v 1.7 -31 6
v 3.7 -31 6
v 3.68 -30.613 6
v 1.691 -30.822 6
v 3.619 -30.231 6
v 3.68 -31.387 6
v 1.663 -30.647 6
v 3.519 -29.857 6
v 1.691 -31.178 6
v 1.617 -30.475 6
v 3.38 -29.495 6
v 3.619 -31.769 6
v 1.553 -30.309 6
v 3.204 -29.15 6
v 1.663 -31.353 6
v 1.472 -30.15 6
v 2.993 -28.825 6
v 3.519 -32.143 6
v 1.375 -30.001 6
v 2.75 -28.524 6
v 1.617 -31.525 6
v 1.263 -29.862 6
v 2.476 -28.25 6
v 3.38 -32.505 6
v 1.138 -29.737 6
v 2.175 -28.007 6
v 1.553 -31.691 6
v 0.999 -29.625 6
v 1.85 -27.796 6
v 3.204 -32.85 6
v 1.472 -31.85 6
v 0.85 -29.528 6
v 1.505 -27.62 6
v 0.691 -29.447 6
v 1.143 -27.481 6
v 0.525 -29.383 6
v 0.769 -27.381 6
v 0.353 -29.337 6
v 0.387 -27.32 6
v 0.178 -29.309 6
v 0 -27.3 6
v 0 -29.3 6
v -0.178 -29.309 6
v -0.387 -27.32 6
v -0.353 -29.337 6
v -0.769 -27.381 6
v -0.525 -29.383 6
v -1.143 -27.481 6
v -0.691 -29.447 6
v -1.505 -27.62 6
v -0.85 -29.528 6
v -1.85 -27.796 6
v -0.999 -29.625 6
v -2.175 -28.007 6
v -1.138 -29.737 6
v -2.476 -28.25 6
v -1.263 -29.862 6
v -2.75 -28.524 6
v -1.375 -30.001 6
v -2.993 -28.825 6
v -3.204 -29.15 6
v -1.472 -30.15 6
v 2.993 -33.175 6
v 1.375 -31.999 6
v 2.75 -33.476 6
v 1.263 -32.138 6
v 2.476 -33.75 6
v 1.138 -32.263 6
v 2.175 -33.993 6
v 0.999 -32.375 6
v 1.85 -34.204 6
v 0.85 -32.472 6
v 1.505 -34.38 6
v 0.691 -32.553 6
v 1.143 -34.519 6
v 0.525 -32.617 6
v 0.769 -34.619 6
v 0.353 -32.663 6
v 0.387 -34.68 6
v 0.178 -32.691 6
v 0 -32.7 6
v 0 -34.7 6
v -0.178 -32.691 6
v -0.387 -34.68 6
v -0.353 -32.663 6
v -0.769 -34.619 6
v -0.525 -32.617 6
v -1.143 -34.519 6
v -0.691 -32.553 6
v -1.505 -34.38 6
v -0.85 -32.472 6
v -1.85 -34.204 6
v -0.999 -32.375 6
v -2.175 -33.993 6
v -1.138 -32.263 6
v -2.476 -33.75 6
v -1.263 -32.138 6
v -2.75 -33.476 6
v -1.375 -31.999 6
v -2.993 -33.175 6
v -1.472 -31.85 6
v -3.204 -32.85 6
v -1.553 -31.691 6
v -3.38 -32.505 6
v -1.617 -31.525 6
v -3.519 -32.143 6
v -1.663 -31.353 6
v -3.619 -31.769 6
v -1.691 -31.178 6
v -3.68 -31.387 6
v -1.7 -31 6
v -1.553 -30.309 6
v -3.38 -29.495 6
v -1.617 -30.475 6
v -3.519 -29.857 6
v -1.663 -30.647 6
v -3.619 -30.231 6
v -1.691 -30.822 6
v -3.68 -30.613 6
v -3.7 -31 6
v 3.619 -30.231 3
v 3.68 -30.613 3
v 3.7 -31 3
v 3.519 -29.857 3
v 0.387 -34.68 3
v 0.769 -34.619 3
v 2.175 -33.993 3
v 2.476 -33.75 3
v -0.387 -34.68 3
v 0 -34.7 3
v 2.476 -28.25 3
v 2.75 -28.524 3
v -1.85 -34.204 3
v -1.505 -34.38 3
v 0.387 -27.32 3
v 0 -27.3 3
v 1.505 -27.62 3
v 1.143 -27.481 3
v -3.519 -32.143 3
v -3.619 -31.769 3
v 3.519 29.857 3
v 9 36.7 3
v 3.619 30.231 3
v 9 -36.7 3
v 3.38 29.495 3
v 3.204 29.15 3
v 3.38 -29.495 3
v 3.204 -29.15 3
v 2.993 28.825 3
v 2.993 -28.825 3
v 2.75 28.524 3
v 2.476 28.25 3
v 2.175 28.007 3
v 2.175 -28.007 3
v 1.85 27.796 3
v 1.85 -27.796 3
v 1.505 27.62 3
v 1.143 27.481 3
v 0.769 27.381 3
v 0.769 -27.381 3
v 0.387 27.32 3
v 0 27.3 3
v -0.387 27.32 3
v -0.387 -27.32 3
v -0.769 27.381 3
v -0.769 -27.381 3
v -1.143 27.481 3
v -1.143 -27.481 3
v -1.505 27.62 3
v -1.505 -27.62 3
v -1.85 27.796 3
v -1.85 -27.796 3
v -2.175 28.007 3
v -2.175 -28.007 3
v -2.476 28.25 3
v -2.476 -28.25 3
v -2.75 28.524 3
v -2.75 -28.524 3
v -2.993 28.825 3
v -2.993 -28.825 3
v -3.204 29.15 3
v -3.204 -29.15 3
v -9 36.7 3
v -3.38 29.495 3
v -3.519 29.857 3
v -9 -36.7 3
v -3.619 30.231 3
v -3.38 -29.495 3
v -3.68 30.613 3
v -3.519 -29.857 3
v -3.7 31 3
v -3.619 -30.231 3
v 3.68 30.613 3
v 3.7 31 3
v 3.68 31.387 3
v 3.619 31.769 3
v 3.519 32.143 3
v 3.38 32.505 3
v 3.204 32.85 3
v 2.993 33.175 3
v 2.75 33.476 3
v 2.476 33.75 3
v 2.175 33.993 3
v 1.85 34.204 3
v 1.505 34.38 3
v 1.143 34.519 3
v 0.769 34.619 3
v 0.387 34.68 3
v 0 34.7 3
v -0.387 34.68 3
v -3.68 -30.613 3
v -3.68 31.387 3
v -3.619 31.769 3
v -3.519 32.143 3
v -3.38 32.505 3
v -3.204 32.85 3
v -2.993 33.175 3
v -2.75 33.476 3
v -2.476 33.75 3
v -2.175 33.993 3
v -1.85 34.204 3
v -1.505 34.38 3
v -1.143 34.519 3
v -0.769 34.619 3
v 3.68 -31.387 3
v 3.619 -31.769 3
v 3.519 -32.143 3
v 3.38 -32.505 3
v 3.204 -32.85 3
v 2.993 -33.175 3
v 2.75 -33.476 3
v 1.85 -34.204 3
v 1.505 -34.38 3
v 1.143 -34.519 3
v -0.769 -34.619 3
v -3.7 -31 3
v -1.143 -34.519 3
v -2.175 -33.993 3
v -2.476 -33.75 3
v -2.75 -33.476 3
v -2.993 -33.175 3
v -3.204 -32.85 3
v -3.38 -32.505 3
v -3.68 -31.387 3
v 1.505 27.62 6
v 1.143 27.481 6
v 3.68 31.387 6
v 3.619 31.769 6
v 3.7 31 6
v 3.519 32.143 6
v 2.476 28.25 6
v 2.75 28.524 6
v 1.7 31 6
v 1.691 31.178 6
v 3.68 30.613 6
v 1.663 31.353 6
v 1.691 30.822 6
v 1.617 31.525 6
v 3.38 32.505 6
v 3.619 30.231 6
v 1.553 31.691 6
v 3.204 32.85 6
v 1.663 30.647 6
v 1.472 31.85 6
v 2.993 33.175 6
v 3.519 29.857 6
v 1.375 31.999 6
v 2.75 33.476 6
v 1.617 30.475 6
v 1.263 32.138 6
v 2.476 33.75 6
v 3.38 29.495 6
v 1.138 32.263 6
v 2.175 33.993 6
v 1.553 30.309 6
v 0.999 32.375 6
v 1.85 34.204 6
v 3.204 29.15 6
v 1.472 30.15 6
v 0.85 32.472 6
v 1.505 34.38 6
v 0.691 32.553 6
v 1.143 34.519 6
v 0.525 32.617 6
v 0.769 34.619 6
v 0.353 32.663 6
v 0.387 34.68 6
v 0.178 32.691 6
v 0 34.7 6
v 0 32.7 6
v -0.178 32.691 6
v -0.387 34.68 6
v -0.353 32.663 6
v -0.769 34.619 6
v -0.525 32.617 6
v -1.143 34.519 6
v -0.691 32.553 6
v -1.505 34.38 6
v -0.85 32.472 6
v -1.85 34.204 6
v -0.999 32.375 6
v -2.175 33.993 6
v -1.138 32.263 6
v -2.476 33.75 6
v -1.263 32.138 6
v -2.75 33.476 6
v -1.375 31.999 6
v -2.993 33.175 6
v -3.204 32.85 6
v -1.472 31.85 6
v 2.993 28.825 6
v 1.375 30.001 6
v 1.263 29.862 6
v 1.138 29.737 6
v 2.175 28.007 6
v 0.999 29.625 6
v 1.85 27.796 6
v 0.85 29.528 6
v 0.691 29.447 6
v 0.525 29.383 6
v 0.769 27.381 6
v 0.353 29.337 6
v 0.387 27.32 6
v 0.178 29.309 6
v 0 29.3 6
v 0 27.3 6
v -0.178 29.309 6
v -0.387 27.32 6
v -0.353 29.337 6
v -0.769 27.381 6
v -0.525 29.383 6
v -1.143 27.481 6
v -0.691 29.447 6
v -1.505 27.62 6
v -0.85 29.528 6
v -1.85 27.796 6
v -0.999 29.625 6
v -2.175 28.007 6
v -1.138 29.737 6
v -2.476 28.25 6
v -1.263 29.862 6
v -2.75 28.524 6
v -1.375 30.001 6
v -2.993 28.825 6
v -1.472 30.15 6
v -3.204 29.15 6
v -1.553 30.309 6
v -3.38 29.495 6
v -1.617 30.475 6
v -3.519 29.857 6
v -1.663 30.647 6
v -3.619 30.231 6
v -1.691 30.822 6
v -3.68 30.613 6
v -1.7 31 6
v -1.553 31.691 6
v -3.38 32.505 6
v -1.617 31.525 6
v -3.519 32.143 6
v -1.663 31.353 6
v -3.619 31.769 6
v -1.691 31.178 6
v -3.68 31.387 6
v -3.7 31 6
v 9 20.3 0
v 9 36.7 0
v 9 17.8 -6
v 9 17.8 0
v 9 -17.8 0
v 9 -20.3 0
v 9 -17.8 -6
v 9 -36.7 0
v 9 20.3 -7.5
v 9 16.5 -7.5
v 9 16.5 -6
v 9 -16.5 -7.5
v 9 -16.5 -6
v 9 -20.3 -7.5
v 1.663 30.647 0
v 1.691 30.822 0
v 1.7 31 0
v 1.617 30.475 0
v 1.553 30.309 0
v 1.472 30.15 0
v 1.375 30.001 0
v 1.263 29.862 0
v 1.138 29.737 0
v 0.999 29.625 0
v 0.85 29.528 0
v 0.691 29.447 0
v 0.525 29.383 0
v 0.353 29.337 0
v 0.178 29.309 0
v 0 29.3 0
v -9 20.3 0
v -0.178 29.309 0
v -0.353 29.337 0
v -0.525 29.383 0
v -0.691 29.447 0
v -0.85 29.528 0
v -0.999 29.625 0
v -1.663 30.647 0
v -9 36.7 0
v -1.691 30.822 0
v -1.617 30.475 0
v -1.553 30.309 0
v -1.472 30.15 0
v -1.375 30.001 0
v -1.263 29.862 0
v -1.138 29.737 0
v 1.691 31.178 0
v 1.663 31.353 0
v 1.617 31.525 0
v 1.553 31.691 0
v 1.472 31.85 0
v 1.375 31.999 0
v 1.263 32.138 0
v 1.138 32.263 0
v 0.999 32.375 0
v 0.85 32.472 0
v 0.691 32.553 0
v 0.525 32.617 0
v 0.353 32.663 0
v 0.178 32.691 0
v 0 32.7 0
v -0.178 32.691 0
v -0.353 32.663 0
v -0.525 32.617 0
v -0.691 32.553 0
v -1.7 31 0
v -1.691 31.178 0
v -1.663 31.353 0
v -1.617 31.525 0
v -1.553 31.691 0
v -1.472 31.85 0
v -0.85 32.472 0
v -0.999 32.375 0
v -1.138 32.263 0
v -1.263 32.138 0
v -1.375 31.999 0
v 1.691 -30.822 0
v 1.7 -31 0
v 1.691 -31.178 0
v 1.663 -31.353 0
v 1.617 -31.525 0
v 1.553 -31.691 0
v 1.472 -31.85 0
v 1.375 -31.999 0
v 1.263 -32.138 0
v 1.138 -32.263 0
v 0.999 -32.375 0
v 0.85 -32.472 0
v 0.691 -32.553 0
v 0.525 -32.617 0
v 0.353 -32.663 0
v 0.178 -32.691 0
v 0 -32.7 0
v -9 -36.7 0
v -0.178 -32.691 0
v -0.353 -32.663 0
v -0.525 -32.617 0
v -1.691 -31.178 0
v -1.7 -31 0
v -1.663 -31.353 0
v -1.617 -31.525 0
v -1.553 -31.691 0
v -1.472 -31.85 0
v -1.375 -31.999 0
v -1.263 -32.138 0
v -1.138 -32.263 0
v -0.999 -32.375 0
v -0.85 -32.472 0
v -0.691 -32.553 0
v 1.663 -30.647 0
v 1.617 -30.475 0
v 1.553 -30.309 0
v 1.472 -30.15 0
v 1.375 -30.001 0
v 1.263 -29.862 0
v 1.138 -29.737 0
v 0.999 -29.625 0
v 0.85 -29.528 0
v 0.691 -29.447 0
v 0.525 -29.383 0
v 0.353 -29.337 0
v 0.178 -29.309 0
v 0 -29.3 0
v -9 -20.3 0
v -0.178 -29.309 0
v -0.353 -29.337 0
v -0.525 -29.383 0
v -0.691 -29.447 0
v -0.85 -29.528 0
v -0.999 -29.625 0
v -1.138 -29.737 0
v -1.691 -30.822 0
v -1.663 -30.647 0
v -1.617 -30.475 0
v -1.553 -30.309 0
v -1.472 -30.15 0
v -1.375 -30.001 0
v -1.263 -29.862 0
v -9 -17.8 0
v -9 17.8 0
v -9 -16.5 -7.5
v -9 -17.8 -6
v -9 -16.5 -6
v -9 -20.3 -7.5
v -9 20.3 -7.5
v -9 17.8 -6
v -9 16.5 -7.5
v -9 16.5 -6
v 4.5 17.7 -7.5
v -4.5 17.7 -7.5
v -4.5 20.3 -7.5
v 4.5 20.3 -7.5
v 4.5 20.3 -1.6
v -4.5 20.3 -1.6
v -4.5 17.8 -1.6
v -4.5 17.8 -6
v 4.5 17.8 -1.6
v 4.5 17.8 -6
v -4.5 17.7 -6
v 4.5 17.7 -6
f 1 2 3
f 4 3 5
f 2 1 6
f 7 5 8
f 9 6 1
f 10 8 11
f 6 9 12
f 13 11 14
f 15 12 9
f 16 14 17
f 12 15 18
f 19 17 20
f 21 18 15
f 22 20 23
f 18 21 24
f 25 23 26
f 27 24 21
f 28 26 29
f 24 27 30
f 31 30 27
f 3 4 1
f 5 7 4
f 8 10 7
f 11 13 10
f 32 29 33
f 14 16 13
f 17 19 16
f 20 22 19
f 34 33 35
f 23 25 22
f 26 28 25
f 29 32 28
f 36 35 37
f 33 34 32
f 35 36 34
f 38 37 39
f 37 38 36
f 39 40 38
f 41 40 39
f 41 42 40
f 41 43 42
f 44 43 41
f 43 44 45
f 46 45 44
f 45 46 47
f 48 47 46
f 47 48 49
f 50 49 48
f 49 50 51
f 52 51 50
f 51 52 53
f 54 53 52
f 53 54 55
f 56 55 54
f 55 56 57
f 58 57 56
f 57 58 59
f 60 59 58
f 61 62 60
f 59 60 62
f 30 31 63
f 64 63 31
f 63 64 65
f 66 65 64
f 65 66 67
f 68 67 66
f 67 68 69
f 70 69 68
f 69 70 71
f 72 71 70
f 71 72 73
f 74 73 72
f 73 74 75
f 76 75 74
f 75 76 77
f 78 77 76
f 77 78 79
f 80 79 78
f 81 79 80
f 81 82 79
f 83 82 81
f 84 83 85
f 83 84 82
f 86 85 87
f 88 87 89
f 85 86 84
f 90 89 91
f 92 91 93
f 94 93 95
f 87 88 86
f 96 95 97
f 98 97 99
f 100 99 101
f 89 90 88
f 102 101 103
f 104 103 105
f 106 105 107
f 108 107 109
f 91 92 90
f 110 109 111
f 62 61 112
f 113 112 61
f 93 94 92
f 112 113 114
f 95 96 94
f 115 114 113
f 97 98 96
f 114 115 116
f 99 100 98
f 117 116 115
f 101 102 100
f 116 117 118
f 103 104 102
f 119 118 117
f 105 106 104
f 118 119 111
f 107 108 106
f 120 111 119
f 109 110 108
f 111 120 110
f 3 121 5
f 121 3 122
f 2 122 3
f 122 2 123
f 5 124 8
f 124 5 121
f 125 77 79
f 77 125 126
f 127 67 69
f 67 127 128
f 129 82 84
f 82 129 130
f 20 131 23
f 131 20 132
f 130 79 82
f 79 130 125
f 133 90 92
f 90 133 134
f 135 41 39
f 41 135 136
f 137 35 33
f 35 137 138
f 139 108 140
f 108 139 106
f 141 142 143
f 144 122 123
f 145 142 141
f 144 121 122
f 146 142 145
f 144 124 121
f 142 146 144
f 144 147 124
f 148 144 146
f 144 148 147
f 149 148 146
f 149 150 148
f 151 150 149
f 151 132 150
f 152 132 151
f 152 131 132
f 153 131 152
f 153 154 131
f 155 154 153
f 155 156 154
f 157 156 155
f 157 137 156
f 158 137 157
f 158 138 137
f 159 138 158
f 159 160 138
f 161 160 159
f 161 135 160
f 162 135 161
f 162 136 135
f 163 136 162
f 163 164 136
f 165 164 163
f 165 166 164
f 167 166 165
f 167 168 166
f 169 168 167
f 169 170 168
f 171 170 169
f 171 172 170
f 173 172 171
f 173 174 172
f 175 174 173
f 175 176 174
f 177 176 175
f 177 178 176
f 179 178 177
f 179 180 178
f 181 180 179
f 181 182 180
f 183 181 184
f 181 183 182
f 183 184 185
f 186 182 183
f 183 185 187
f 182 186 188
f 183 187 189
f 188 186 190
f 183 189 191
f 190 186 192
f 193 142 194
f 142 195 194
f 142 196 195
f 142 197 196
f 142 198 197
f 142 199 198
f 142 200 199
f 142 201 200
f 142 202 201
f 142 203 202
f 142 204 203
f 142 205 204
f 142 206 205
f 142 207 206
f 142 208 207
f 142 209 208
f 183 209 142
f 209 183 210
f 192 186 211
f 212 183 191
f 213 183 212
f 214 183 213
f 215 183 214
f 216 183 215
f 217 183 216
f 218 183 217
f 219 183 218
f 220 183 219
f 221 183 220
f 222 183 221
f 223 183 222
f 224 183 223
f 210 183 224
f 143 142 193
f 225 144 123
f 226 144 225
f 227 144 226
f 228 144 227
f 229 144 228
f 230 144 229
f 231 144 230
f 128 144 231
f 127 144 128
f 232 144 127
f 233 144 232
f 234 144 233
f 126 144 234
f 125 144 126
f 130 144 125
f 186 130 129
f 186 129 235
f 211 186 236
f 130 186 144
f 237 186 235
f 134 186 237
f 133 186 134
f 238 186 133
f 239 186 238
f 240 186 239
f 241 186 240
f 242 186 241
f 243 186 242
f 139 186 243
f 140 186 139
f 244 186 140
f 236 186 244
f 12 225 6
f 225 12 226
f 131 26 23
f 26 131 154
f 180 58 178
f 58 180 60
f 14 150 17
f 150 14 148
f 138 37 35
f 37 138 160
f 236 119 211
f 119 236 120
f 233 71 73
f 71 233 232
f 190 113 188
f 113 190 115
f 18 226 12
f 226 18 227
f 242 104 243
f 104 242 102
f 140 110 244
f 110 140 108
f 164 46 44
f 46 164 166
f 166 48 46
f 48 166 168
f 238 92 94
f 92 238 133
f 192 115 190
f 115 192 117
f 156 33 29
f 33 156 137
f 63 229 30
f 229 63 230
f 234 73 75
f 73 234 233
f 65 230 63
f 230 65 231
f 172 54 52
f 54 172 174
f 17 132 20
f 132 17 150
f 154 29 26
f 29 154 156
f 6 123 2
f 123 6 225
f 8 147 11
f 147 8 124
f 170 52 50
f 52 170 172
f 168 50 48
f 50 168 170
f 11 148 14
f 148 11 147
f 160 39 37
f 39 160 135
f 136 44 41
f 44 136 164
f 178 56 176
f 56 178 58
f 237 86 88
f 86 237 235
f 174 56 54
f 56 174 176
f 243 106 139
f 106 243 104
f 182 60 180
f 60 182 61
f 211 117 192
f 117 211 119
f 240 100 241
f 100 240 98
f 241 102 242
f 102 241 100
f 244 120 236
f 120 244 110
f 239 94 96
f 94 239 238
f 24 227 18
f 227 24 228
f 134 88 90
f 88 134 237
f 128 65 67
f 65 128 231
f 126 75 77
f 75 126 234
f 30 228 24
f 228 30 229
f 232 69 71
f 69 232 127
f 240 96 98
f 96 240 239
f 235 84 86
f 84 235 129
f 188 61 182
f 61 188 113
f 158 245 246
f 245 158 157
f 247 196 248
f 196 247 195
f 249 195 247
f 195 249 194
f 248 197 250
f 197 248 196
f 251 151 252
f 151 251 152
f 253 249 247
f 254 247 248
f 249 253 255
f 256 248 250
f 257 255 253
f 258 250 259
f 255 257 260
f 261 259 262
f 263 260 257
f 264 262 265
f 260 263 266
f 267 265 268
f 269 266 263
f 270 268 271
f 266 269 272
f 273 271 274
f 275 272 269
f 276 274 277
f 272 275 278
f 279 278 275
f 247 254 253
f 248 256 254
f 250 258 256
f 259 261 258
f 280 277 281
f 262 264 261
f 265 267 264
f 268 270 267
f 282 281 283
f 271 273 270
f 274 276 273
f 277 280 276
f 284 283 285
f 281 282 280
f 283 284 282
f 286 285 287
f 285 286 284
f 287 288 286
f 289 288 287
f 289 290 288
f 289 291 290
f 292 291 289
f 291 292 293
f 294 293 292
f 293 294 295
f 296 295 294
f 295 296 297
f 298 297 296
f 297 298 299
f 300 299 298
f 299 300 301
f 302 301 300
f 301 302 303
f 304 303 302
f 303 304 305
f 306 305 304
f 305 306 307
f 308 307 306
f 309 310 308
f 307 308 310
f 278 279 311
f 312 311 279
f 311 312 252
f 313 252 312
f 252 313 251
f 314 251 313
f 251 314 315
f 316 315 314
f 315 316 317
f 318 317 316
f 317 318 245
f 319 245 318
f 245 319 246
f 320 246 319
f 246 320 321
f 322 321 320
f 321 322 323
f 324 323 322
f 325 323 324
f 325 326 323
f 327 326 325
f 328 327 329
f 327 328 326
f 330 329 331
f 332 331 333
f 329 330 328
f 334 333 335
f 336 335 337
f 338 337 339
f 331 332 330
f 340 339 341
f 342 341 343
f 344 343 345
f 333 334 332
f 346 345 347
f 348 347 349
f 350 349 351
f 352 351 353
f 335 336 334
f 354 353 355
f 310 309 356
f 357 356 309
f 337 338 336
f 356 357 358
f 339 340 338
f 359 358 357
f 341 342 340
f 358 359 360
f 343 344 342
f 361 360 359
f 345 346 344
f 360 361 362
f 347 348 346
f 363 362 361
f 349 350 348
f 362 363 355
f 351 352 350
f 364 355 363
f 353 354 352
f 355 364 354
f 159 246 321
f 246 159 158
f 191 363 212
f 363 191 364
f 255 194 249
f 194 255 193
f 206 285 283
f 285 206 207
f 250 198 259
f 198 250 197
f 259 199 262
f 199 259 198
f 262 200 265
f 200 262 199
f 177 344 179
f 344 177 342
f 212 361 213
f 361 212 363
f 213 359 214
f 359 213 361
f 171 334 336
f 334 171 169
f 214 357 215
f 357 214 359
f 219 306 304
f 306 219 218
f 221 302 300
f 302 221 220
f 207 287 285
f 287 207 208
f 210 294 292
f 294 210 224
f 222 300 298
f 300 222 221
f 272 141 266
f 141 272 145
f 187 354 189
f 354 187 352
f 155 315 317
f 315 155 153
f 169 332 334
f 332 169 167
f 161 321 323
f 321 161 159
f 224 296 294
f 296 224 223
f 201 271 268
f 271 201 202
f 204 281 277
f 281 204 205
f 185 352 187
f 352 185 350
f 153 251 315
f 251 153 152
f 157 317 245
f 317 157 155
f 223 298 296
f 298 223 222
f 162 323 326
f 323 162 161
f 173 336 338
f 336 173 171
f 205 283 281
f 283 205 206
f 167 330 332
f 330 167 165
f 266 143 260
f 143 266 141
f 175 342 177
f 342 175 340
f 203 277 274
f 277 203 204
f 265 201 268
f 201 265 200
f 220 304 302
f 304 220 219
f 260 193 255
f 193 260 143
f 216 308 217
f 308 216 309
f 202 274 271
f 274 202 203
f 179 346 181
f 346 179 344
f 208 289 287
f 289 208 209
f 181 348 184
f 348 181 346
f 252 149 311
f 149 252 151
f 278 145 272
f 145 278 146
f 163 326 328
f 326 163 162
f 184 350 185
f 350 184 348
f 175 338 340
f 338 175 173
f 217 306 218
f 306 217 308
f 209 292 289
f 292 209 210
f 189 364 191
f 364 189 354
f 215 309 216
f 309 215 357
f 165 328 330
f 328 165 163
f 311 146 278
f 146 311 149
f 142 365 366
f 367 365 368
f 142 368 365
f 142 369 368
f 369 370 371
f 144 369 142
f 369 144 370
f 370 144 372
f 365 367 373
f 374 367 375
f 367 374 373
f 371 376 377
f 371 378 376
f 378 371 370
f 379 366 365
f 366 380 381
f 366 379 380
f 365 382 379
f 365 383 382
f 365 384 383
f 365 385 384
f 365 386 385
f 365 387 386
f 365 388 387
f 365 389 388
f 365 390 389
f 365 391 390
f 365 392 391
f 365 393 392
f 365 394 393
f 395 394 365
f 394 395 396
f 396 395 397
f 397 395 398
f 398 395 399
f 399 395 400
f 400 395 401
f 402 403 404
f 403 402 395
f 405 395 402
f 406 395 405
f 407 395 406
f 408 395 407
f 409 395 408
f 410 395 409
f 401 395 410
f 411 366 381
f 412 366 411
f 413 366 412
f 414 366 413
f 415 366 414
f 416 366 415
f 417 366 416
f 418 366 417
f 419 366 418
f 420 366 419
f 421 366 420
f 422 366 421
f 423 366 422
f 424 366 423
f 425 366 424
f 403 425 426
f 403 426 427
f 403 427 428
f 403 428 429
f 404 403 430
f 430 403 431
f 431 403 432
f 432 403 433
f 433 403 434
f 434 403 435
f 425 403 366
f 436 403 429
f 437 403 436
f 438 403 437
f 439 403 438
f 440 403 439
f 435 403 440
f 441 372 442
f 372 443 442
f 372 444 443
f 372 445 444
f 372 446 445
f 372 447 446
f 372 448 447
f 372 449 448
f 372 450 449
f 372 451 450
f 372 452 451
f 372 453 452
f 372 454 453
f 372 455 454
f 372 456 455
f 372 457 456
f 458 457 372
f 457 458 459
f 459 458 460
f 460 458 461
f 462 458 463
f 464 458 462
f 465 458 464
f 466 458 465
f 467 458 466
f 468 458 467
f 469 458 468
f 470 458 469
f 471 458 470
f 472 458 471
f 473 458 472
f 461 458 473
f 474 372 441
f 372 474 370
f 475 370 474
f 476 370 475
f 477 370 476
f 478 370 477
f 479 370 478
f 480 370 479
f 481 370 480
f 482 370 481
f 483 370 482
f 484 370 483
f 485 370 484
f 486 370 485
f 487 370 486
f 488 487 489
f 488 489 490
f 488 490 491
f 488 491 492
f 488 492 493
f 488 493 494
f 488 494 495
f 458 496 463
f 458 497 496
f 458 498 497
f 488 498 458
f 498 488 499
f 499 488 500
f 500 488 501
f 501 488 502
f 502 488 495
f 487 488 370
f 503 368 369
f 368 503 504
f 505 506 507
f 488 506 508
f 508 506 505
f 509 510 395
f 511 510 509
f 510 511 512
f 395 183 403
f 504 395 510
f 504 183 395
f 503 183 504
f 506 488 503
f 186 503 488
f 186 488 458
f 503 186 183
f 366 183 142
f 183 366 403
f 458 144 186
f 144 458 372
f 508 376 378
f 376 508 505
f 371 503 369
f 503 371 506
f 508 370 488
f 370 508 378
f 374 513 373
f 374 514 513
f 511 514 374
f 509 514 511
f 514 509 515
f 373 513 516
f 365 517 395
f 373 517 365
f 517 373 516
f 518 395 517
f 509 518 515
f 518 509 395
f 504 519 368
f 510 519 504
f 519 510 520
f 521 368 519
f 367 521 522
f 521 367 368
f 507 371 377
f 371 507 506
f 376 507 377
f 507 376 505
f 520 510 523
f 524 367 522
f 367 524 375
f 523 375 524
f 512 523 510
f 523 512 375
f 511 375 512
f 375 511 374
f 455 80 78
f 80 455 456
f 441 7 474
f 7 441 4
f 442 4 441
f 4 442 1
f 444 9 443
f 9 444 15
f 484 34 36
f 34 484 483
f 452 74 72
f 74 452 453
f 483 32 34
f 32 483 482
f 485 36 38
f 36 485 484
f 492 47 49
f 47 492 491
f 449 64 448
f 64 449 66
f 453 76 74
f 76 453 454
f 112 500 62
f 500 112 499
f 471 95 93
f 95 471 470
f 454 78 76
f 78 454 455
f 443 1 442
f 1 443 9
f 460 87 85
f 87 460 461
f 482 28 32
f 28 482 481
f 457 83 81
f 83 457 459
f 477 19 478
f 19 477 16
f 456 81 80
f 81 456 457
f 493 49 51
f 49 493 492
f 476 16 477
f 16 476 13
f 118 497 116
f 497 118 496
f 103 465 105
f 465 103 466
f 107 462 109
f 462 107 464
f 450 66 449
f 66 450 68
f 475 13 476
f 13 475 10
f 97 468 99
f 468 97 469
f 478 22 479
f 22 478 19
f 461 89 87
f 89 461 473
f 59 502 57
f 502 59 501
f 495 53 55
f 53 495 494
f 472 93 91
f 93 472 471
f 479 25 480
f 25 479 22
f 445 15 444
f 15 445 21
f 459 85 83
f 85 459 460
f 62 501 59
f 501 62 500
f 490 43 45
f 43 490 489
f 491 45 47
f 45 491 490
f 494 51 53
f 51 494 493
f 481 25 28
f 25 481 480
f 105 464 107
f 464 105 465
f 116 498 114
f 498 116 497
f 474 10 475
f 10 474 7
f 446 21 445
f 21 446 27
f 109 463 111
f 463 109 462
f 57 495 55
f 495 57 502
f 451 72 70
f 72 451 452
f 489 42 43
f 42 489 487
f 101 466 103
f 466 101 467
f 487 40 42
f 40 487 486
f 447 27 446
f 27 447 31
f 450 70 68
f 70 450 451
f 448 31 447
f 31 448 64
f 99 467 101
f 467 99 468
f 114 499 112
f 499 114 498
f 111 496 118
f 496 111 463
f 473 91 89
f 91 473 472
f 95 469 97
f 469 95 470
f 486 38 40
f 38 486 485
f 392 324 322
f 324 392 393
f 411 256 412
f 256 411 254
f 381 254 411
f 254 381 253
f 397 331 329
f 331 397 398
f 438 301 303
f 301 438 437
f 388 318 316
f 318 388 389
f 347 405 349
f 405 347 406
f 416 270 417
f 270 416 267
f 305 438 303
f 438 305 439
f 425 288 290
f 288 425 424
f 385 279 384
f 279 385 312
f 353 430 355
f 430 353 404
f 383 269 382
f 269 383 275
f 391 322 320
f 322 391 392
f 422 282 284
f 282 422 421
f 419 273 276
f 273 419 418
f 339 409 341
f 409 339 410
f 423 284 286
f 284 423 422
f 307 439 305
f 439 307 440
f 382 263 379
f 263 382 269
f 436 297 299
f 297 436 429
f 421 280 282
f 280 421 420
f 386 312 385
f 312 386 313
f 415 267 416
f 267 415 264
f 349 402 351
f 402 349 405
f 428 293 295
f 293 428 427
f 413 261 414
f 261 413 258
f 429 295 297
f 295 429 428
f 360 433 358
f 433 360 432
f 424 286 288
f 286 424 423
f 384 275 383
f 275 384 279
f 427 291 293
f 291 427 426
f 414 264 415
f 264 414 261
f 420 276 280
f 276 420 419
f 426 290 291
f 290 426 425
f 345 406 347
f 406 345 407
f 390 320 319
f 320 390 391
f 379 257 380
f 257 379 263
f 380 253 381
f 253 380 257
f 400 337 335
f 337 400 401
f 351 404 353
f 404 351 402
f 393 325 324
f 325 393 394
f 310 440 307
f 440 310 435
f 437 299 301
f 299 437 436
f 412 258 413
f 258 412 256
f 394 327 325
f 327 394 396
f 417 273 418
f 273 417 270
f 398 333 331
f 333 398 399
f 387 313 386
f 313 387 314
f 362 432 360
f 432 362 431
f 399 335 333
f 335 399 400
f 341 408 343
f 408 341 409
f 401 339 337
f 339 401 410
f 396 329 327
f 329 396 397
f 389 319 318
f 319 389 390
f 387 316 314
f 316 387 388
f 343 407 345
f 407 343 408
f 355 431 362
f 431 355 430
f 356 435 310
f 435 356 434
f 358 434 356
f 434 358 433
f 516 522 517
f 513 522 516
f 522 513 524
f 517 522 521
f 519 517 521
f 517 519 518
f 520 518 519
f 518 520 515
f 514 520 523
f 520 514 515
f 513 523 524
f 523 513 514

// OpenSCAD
// DIN Rail Bracket for MKS DLC32 MAX v1.1
// PCB: 100x70mm, mounting holes: 92x62mm (M3)
// Print 2x - one for each short edge of the PCB
//
// Simple snap-fit DIN rail bracket with two M3 mounting holes.
// Clips onto standard 35mm DIN rail from above.

$fn = 60;

// PCB mounting
hole_spacing = 62;       // distance between the 2 holes (across rail)
hole_dia = 3.4;          // M3 clearance hole
standoff_h = 3;          // PCB standoff height above bracket

// DIN rail dimensions (standard 35mm top-hat rail)
rail_w = 35;             // rail width
rail_h = 7.5;            // rail height (depth of channel)
rail_lip = 1.0;          // lip thickness on rail edge
rail_lip_h = 1.5;        // height of the lip fold

// Bracket dimensions
wall = 2.5;              // wall thickness
base_h = 3;              // base plate thickness
clip_gap = 0.3;          // tolerance for rail fit
bracket_len = 18;        // length along the rail (X direction)

// Derived
total_w = hole_spacing + hole_dia + 2 * 4; // width to fit holes with margin
clip_inner = rail_w + 2 * clip_gap;
clip_outer = clip_inner + 2 * wall;

module din_rail_clip() {
    // Base plate that sits on top of the rail
    difference() {
        union() {
            // Main base plate
            translate([-bracket_len/2, -total_w/2, 0])
                cube([bracket_len, total_w, base_h]);

            // Rail clip walls (hang down from base to grip rail)
            // Left wall
            translate([-bracket_len/2, -clip_inner/2 - wall, -rail_h])
                cube([bracket_len, wall, rail_h + base_h]);
            // Right wall
            translate([-bracket_len/2, clip_inner/2, -rail_h])
                cube([bracket_len, wall, rail_h + base_h]);

            // Lip hooks at bottom (snap under rail edges)
            // Left lip
            translate([-bracket_len/2, -clip_inner/2 - wall, -rail_h])
                cube([bracket_len, wall + rail_lip + clip_gap, rail_lip_h]);
            // Right lip
            translate([-bracket_len/2, clip_inner/2 - rail_lip - clip_gap, -rail_h])
                cube([bracket_len, wall + rail_lip + clip_gap, rail_lip_h]);

            // PCB standoffs
            for (y = [-hole_spacing/2, hole_spacing/2]) {
                translate([0, y, base_h])
                    cylinder(d=hole_dia + 4, h=standoff_h);
            }
        }

        // M3 holes through standoffs and base
        for (y = [-hole_spacing/2, hole_spacing/2]) {
            translate([0, y, -1])
                cylinder(d=hole_dia, h=base_h + standoff_h + 2);
        }

        // Flex slot in one clip wall for snap-on (makes one side flexible)
        translate([-bracket_len/4, clip_inner/2 - 0.1, -rail_h - 0.1])
            cube([bracket_len/2, wall + 0.2, rail_h - rail_lip_h]);
    }
}

din_rail_clip();
